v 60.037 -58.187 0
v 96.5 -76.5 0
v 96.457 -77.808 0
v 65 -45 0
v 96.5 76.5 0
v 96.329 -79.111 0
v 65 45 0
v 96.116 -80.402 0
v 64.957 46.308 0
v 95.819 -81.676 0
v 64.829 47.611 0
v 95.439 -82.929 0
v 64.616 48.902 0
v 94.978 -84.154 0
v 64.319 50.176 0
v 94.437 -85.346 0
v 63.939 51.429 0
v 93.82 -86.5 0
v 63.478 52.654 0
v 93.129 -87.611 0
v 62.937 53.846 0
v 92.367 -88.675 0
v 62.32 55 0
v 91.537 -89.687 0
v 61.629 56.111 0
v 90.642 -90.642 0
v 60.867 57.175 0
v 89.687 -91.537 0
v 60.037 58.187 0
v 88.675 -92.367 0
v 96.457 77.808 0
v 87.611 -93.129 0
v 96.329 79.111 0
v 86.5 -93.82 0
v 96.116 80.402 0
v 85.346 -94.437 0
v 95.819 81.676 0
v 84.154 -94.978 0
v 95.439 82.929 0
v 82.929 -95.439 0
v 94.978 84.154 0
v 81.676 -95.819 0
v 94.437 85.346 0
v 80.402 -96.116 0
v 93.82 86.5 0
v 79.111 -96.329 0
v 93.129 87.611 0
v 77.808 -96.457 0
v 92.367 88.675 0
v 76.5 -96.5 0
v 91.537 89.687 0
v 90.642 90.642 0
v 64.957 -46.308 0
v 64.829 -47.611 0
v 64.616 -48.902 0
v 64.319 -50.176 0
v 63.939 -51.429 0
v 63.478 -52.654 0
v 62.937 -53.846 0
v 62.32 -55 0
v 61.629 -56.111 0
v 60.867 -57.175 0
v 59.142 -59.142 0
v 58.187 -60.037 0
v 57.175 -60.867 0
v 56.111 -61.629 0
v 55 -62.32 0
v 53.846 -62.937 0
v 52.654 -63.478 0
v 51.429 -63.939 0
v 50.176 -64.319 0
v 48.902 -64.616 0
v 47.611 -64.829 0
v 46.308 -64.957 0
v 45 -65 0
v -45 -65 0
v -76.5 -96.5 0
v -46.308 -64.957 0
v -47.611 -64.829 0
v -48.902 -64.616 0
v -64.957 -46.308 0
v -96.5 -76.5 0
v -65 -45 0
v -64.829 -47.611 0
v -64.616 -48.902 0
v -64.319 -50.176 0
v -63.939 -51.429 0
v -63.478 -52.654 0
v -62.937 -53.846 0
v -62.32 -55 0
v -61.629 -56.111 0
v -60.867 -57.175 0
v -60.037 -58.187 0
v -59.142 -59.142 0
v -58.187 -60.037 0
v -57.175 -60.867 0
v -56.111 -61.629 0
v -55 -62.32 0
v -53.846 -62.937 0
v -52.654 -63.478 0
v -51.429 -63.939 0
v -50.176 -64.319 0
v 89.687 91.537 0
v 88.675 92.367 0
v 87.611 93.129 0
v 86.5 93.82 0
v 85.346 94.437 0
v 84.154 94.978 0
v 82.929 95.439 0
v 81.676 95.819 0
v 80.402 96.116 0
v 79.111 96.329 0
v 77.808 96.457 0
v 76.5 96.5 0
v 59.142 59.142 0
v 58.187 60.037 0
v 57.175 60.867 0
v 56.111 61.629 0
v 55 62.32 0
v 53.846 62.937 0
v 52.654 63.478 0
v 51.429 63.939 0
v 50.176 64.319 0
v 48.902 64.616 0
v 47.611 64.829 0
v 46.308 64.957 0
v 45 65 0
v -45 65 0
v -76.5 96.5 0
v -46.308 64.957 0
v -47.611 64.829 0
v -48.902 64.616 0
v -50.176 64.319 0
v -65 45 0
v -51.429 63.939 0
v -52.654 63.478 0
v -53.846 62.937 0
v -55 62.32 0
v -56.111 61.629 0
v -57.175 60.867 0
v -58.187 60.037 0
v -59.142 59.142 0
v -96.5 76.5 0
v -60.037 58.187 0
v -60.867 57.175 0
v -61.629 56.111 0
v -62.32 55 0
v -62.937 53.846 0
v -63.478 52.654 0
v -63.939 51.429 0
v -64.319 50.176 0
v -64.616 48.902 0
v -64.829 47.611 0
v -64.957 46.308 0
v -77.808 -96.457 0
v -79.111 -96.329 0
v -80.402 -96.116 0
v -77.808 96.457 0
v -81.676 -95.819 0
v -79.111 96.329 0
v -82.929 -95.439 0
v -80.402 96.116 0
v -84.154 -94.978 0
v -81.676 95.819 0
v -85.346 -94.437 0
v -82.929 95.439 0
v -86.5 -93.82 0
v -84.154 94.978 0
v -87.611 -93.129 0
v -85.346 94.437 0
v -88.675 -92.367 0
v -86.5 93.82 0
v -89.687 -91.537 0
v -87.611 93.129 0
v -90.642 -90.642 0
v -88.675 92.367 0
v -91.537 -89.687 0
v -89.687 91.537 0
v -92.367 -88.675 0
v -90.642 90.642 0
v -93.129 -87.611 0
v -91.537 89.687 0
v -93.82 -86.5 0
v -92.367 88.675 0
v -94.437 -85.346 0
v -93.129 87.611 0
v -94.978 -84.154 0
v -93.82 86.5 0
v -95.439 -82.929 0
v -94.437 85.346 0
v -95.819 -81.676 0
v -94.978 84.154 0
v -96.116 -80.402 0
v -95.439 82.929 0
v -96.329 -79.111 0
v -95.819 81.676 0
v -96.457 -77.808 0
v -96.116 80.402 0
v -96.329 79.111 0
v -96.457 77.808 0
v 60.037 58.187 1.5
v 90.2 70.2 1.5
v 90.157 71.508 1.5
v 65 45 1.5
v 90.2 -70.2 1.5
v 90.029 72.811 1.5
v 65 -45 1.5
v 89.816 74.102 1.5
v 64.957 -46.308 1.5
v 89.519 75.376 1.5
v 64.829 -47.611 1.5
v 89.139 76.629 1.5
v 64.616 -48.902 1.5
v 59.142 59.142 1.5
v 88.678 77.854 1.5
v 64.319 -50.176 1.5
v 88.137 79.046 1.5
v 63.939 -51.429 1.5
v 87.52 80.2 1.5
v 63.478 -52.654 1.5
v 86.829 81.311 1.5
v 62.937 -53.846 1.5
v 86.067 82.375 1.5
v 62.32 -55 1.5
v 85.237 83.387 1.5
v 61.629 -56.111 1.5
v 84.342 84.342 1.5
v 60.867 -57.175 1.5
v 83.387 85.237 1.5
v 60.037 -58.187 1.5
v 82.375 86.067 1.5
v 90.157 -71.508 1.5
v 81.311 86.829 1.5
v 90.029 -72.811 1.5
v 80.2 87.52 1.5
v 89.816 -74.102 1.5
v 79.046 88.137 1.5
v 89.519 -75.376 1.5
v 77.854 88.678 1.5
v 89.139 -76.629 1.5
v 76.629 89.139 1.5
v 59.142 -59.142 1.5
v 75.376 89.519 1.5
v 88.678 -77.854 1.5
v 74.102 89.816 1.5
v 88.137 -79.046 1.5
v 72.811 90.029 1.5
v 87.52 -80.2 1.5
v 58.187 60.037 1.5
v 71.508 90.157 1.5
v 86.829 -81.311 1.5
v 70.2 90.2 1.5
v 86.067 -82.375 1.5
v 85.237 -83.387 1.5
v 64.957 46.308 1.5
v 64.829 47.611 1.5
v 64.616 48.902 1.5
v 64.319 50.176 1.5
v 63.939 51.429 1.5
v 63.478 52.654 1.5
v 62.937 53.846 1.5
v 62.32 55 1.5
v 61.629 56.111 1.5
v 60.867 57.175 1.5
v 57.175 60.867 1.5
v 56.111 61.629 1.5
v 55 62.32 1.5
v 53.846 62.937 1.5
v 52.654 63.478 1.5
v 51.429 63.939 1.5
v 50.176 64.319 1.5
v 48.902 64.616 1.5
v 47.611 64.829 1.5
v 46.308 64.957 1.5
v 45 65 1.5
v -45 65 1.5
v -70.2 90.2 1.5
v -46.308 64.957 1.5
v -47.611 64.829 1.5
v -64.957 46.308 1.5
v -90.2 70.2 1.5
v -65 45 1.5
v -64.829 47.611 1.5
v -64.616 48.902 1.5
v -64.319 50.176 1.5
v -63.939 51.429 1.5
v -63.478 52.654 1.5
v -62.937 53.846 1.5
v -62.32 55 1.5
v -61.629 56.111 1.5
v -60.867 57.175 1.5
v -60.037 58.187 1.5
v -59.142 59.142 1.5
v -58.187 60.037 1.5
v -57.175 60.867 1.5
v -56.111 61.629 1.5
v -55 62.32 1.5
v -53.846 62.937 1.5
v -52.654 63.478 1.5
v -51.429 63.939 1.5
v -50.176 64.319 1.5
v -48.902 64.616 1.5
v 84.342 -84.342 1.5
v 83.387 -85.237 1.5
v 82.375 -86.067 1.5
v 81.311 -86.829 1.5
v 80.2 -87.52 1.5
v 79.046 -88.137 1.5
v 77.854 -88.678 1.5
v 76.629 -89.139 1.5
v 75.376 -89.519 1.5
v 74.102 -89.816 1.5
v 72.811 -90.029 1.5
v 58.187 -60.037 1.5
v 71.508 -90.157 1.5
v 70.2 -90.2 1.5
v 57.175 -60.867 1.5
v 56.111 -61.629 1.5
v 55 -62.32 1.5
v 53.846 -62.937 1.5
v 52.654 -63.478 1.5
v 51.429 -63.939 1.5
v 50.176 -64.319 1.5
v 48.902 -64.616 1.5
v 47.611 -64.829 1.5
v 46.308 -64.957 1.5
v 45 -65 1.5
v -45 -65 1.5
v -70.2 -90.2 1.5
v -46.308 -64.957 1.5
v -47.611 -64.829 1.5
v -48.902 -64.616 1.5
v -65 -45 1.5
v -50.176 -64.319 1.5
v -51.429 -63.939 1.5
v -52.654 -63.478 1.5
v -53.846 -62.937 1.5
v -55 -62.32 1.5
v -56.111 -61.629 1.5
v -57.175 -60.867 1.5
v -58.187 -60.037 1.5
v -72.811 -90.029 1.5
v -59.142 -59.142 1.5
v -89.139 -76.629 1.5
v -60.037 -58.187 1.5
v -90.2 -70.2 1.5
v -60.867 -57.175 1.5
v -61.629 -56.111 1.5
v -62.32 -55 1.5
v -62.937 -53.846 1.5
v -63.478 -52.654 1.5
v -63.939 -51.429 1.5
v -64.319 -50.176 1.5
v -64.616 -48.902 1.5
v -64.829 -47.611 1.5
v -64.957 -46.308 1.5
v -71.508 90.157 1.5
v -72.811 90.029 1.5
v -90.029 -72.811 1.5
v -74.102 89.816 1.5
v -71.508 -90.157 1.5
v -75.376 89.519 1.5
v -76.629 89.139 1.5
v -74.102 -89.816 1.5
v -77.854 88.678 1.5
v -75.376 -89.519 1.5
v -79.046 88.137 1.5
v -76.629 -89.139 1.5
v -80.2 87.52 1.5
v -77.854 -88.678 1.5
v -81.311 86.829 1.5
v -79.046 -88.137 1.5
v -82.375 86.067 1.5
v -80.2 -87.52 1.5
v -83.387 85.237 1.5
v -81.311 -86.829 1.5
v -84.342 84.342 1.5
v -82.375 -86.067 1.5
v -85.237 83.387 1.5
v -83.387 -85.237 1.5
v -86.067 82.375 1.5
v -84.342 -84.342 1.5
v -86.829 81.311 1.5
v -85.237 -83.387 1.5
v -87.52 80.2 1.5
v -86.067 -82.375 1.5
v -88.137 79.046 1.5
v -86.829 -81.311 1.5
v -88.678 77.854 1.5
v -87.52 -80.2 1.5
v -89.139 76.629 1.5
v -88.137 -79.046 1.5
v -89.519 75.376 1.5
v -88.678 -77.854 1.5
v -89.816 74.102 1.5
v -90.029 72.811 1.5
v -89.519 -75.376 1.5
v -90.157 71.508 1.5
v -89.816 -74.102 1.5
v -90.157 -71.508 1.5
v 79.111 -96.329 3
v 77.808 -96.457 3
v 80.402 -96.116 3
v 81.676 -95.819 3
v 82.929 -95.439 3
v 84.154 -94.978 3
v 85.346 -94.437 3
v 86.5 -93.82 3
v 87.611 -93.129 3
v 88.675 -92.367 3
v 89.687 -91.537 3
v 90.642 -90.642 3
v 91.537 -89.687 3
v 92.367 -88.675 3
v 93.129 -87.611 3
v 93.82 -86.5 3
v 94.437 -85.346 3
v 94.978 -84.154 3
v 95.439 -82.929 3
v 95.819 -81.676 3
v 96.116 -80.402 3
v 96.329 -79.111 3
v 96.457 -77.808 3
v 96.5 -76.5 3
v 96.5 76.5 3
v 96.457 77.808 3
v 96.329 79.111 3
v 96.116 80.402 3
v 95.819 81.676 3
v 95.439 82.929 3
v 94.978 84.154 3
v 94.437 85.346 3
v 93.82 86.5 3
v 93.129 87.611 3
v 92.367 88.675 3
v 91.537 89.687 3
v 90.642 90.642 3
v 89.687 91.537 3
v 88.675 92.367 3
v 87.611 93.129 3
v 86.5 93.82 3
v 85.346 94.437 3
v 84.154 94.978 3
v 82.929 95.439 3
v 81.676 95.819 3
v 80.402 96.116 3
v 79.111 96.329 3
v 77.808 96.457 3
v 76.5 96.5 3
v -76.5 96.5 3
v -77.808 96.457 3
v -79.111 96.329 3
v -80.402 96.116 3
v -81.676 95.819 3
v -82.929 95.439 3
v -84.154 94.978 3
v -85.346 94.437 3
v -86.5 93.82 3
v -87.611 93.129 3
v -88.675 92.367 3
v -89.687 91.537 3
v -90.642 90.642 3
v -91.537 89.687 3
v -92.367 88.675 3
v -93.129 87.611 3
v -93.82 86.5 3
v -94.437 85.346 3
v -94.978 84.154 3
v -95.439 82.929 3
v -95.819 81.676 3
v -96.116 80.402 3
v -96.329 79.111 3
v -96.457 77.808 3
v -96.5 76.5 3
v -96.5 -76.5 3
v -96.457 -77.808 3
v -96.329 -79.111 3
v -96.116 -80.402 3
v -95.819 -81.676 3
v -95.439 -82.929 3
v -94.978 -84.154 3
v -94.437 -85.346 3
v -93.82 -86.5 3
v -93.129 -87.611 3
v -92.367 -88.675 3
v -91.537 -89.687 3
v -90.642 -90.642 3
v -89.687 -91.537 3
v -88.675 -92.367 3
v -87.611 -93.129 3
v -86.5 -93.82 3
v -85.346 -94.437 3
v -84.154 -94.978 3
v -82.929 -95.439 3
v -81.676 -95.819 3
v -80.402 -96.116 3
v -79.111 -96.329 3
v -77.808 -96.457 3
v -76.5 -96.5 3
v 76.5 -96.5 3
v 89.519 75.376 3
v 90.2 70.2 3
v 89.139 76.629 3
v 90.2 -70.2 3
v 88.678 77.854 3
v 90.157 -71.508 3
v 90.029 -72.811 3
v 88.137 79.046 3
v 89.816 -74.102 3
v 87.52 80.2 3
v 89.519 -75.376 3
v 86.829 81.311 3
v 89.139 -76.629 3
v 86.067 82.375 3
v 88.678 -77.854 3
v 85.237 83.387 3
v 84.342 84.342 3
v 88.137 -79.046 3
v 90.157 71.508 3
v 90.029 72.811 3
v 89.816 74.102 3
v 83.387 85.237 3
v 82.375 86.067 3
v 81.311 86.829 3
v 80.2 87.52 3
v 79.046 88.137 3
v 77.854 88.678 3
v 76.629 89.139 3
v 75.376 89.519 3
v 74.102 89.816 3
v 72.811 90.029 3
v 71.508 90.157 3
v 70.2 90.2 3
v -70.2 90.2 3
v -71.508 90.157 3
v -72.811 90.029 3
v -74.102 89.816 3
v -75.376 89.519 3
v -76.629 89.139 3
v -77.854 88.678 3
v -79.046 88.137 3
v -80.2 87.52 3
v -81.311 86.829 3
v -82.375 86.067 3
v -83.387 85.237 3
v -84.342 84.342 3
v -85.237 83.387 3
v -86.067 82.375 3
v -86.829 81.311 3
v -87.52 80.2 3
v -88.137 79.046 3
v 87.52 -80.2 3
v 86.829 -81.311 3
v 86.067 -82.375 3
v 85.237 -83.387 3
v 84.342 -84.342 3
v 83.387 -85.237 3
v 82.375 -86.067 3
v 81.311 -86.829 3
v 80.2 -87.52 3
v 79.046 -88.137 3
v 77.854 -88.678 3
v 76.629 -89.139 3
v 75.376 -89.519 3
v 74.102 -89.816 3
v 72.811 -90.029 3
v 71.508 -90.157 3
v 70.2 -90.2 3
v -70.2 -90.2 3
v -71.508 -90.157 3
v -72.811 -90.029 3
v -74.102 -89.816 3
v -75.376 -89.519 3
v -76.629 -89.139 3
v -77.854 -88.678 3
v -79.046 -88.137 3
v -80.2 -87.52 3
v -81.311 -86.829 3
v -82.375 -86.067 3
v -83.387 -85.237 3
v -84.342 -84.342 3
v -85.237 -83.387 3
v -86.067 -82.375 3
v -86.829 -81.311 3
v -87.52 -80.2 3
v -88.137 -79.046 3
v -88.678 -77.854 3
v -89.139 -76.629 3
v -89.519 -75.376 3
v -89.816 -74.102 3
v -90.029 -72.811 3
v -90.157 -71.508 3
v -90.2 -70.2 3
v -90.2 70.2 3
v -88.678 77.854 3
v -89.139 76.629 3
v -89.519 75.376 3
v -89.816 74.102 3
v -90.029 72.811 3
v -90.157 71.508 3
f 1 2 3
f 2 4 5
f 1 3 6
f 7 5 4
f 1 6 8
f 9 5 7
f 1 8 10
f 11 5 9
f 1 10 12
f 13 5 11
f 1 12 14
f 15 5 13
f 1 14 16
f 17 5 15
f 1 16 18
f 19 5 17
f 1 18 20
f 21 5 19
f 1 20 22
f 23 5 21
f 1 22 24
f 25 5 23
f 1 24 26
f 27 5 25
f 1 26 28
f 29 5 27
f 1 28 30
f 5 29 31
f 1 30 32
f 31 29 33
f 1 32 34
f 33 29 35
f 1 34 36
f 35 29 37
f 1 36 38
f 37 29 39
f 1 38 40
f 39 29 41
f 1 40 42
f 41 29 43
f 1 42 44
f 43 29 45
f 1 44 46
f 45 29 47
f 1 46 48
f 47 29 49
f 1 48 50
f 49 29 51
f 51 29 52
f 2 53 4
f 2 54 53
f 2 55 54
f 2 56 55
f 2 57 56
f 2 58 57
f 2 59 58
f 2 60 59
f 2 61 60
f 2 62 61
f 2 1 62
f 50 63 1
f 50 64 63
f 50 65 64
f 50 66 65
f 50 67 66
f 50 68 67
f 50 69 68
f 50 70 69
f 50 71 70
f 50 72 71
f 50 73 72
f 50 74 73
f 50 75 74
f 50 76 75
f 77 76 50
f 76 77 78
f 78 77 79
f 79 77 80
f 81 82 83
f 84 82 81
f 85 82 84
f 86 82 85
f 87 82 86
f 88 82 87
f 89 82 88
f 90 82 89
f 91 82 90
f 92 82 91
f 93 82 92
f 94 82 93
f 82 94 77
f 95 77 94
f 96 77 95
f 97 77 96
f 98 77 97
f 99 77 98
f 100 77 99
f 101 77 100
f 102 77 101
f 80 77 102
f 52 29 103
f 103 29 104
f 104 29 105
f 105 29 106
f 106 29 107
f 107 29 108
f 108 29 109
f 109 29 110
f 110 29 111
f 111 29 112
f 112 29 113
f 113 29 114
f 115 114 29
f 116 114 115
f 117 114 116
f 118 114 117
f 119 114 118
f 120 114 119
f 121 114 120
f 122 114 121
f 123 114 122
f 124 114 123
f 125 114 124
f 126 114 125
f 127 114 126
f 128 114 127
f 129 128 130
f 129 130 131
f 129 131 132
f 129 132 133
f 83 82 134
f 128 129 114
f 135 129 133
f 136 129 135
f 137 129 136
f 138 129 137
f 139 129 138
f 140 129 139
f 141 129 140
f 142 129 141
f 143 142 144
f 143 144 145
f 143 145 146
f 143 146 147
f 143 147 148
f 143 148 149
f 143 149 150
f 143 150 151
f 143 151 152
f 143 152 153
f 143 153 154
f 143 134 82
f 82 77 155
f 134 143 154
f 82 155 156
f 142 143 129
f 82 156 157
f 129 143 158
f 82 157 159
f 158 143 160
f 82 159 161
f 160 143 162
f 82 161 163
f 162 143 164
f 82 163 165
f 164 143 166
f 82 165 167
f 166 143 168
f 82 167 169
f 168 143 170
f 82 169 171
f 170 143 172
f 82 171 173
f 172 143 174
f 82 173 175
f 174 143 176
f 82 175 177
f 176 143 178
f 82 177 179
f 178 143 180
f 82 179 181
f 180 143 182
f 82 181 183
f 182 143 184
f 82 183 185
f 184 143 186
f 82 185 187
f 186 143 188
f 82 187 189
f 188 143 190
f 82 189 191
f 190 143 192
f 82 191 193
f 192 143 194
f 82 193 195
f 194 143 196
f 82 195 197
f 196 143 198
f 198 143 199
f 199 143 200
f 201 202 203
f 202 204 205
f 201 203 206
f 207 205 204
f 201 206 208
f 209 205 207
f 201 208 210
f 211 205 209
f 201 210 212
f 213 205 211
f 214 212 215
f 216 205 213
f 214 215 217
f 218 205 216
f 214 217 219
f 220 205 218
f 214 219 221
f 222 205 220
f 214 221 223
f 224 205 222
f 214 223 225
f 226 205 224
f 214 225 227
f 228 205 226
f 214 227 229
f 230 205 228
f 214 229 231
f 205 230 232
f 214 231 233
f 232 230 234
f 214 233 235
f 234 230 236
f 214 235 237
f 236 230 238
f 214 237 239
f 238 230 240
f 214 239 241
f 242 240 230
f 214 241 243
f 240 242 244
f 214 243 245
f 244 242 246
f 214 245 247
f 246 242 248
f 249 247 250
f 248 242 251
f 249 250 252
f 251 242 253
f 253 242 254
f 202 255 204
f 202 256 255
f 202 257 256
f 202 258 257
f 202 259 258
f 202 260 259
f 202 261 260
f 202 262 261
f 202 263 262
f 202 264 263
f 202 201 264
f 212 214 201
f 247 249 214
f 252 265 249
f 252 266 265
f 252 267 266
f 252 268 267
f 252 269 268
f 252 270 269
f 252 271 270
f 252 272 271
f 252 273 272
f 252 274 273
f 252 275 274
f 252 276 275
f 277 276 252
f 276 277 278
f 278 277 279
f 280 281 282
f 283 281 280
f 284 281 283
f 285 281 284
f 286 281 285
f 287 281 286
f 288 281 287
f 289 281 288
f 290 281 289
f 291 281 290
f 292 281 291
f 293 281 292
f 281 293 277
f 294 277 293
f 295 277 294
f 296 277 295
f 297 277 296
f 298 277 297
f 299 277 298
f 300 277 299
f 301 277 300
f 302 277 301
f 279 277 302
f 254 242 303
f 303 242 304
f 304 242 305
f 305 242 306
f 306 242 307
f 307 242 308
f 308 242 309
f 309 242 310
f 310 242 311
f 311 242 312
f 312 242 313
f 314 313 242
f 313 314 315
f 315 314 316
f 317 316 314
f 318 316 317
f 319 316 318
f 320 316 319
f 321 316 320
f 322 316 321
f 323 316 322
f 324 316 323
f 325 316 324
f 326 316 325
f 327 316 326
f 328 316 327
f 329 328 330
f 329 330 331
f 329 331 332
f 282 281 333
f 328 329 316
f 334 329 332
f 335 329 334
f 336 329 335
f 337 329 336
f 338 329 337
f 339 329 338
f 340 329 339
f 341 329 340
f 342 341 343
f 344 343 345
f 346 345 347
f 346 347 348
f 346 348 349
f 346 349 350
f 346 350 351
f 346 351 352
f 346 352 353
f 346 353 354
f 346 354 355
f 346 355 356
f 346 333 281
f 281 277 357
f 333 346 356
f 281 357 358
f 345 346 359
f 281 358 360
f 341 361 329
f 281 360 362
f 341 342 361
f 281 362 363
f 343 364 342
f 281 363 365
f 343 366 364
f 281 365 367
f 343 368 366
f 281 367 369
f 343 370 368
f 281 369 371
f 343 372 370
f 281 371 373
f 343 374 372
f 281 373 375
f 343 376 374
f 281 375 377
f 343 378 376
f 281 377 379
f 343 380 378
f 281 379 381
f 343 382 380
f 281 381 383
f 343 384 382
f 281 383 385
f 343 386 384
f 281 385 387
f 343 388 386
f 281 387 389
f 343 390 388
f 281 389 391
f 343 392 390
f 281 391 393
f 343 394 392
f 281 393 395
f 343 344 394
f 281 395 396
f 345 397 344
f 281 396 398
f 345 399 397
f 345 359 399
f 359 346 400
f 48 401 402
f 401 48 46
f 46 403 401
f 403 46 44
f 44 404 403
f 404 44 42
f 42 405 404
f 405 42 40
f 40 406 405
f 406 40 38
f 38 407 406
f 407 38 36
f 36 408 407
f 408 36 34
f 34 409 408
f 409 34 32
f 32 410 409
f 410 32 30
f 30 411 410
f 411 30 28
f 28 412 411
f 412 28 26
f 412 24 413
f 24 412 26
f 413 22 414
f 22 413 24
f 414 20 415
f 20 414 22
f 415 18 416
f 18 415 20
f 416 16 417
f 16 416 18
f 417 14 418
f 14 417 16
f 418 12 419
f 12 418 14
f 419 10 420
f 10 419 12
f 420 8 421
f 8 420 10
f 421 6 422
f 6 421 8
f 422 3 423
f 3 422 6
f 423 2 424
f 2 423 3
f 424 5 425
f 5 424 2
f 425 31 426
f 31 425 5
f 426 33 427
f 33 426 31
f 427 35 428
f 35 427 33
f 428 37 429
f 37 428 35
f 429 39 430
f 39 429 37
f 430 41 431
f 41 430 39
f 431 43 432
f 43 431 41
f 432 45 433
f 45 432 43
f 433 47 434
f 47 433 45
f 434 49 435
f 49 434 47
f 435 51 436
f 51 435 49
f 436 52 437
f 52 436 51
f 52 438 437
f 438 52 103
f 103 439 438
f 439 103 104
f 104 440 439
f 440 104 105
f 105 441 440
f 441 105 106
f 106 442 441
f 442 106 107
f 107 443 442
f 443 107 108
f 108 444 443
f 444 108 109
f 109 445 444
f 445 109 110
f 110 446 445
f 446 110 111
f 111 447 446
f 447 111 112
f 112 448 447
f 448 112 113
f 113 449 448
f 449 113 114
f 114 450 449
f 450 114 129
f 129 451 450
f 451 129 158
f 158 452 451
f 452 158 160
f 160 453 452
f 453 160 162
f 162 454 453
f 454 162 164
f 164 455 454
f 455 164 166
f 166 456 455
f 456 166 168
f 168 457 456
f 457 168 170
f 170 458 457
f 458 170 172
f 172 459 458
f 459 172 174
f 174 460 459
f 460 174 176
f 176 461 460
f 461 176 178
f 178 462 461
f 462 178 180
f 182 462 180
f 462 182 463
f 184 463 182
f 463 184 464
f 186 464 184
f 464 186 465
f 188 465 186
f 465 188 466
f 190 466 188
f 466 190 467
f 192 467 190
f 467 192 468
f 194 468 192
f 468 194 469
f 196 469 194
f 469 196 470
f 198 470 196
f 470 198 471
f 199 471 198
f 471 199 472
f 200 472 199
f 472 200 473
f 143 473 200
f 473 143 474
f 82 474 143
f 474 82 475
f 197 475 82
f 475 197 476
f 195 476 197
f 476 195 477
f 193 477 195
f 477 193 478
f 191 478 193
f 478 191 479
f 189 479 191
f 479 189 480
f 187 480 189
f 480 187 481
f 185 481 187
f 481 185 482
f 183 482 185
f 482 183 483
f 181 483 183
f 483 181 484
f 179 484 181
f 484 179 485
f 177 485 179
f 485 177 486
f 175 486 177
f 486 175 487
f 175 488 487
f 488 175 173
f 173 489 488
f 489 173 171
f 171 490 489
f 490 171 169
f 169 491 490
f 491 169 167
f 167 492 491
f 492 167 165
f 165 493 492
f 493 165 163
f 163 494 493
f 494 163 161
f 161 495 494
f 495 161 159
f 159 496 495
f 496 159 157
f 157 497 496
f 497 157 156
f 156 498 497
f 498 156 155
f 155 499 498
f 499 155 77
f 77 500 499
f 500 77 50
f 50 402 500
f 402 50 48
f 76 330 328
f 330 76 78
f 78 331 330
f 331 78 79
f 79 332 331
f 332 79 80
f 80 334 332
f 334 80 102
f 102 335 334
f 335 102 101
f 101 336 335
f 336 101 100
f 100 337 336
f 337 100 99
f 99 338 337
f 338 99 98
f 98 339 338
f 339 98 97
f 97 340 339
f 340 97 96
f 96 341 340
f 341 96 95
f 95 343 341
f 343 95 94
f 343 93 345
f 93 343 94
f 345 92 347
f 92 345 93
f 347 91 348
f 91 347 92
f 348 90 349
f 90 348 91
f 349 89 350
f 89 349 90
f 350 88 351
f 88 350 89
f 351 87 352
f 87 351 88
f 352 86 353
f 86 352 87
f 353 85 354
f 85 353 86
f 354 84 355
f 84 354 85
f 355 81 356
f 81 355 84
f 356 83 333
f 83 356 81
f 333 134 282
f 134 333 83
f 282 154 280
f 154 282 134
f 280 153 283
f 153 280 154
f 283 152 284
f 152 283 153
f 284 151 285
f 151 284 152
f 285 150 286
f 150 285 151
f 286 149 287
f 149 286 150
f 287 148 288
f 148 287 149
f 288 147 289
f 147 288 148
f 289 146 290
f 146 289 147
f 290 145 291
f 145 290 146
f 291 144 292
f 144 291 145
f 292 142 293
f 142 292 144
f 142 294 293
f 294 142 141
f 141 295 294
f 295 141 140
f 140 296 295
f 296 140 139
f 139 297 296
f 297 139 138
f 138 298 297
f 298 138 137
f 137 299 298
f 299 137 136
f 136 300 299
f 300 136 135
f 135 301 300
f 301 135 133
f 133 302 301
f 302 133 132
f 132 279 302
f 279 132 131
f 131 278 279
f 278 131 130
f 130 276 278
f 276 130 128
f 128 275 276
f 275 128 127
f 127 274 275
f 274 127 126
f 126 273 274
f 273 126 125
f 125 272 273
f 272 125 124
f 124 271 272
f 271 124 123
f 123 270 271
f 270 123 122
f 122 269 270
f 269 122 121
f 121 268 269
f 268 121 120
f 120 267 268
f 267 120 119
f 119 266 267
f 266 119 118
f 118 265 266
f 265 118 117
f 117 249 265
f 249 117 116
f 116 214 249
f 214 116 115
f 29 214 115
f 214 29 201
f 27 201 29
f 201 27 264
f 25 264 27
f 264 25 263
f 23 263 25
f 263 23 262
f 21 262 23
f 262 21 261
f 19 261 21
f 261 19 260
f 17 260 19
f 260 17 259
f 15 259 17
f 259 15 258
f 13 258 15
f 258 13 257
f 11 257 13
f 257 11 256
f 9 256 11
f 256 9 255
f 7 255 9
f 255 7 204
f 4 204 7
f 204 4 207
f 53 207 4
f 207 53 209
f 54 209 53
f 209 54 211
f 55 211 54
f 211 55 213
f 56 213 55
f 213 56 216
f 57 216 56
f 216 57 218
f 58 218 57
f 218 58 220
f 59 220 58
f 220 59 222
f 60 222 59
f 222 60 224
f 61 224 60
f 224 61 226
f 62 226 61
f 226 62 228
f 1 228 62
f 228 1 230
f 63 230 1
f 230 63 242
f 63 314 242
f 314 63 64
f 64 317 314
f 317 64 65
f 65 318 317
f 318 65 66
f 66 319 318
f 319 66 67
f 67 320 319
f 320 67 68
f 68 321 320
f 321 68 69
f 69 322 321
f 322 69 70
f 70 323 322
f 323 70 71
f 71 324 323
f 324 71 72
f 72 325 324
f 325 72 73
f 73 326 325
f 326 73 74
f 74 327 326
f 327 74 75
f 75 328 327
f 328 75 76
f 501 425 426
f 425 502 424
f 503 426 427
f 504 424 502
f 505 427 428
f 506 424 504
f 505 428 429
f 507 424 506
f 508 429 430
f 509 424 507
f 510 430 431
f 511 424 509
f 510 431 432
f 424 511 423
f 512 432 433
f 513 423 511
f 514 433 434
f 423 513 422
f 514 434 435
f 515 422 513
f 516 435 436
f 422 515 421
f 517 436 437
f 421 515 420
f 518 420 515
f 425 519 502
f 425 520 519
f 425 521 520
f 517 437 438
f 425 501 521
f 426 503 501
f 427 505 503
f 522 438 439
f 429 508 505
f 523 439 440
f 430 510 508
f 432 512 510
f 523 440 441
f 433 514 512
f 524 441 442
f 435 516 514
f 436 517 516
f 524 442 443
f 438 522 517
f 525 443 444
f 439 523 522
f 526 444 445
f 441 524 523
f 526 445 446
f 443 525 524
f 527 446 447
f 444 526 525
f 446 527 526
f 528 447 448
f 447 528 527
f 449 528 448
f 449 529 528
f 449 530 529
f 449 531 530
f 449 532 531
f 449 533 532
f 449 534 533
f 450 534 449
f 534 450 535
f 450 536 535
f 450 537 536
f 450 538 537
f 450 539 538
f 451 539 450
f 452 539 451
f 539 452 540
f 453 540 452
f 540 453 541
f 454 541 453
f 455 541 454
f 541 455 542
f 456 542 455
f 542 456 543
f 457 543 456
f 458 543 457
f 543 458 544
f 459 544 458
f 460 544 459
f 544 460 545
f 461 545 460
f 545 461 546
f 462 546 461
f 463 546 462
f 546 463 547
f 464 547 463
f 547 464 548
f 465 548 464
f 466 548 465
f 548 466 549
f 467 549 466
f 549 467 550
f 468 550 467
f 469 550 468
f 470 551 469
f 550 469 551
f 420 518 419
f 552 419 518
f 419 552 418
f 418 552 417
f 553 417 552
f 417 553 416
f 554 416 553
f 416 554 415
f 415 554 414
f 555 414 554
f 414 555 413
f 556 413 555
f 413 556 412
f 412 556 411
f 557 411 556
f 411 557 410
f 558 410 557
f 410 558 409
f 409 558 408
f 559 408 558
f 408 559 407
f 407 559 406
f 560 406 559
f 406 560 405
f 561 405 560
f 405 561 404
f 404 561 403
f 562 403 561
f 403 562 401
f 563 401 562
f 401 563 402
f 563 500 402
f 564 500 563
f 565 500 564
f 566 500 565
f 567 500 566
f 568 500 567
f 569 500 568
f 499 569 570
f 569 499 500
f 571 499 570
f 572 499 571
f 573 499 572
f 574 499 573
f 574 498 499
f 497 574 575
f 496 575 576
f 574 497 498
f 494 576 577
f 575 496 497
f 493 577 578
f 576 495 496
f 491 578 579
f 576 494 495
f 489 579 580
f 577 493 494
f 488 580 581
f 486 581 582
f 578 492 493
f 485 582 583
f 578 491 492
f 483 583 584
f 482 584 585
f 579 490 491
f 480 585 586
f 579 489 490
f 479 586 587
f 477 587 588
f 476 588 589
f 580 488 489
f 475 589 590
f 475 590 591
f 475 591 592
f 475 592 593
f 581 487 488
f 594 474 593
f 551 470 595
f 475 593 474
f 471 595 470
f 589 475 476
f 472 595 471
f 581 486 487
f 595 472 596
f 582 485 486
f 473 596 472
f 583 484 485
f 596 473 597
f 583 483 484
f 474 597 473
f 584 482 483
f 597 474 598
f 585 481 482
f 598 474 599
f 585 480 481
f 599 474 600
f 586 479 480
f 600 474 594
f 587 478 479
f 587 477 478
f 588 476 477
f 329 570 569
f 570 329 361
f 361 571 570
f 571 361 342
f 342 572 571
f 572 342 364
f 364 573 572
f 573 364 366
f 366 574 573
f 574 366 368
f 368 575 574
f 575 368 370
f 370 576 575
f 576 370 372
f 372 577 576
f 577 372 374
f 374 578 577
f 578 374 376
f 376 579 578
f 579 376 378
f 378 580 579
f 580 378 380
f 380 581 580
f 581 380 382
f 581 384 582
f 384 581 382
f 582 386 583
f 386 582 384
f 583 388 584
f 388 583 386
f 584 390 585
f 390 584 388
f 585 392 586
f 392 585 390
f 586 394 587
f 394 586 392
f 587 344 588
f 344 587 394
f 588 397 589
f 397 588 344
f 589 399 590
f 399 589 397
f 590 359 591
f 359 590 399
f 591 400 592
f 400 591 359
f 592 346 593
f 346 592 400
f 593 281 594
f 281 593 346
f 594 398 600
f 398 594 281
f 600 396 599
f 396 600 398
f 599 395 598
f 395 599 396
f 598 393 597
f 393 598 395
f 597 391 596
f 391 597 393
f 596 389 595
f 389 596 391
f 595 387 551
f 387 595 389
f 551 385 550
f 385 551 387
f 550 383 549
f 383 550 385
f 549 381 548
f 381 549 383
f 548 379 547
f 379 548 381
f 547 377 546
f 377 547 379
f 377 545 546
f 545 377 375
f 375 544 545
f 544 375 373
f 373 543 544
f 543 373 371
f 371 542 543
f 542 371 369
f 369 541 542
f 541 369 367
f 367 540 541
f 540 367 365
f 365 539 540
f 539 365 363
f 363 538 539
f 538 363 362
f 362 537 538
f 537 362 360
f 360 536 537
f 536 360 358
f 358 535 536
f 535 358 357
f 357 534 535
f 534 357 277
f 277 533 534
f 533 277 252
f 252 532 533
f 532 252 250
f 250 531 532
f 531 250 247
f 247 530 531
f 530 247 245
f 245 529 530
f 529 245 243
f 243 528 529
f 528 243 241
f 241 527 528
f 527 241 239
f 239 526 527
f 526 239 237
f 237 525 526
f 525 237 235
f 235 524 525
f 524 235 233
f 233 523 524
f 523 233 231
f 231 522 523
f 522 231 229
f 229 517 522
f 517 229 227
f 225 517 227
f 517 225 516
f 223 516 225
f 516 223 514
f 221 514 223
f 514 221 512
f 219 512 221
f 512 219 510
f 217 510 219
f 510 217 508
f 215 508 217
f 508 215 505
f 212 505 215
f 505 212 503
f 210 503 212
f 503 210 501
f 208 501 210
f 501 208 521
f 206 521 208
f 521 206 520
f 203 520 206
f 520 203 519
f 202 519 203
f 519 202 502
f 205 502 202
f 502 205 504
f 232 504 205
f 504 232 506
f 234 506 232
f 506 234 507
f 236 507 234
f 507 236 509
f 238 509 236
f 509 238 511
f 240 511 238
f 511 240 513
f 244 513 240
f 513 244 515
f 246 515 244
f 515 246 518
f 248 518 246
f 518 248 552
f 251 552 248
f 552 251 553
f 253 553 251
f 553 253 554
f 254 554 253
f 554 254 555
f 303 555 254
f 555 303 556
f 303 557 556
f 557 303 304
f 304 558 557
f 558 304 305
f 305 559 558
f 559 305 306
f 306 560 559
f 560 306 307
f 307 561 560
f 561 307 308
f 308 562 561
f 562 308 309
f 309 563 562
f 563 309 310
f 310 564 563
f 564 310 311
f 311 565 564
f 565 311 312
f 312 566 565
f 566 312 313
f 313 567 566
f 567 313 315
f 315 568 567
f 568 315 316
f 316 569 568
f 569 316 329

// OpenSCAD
$fn=96;

//Fan: 120x120
//Hole distance: 105
//Hole dia: 4
//Base size: 190

//Ket tarto kozti tavolsag: 113

linear_extrude(height=1.5)
{
  difference()
  {
    minkowski()
    {
      square(size=193-40, center=true);
      circle(d=40);
    }
    minkowski()
    {
      square(size=130-40, center=true);
      circle(d=40);
    }
  }
}
translate([0, 0, 1.5]) linear_extrude(height=1.5)
{
  difference()
  {
    minkowski()
    {
      square(size=193-40, center=true);
      circle(d=40);
    }
    minkowski()
    {
      square(size=180.4-40, center=true);
      circle(d=40);
    }
  }
}
